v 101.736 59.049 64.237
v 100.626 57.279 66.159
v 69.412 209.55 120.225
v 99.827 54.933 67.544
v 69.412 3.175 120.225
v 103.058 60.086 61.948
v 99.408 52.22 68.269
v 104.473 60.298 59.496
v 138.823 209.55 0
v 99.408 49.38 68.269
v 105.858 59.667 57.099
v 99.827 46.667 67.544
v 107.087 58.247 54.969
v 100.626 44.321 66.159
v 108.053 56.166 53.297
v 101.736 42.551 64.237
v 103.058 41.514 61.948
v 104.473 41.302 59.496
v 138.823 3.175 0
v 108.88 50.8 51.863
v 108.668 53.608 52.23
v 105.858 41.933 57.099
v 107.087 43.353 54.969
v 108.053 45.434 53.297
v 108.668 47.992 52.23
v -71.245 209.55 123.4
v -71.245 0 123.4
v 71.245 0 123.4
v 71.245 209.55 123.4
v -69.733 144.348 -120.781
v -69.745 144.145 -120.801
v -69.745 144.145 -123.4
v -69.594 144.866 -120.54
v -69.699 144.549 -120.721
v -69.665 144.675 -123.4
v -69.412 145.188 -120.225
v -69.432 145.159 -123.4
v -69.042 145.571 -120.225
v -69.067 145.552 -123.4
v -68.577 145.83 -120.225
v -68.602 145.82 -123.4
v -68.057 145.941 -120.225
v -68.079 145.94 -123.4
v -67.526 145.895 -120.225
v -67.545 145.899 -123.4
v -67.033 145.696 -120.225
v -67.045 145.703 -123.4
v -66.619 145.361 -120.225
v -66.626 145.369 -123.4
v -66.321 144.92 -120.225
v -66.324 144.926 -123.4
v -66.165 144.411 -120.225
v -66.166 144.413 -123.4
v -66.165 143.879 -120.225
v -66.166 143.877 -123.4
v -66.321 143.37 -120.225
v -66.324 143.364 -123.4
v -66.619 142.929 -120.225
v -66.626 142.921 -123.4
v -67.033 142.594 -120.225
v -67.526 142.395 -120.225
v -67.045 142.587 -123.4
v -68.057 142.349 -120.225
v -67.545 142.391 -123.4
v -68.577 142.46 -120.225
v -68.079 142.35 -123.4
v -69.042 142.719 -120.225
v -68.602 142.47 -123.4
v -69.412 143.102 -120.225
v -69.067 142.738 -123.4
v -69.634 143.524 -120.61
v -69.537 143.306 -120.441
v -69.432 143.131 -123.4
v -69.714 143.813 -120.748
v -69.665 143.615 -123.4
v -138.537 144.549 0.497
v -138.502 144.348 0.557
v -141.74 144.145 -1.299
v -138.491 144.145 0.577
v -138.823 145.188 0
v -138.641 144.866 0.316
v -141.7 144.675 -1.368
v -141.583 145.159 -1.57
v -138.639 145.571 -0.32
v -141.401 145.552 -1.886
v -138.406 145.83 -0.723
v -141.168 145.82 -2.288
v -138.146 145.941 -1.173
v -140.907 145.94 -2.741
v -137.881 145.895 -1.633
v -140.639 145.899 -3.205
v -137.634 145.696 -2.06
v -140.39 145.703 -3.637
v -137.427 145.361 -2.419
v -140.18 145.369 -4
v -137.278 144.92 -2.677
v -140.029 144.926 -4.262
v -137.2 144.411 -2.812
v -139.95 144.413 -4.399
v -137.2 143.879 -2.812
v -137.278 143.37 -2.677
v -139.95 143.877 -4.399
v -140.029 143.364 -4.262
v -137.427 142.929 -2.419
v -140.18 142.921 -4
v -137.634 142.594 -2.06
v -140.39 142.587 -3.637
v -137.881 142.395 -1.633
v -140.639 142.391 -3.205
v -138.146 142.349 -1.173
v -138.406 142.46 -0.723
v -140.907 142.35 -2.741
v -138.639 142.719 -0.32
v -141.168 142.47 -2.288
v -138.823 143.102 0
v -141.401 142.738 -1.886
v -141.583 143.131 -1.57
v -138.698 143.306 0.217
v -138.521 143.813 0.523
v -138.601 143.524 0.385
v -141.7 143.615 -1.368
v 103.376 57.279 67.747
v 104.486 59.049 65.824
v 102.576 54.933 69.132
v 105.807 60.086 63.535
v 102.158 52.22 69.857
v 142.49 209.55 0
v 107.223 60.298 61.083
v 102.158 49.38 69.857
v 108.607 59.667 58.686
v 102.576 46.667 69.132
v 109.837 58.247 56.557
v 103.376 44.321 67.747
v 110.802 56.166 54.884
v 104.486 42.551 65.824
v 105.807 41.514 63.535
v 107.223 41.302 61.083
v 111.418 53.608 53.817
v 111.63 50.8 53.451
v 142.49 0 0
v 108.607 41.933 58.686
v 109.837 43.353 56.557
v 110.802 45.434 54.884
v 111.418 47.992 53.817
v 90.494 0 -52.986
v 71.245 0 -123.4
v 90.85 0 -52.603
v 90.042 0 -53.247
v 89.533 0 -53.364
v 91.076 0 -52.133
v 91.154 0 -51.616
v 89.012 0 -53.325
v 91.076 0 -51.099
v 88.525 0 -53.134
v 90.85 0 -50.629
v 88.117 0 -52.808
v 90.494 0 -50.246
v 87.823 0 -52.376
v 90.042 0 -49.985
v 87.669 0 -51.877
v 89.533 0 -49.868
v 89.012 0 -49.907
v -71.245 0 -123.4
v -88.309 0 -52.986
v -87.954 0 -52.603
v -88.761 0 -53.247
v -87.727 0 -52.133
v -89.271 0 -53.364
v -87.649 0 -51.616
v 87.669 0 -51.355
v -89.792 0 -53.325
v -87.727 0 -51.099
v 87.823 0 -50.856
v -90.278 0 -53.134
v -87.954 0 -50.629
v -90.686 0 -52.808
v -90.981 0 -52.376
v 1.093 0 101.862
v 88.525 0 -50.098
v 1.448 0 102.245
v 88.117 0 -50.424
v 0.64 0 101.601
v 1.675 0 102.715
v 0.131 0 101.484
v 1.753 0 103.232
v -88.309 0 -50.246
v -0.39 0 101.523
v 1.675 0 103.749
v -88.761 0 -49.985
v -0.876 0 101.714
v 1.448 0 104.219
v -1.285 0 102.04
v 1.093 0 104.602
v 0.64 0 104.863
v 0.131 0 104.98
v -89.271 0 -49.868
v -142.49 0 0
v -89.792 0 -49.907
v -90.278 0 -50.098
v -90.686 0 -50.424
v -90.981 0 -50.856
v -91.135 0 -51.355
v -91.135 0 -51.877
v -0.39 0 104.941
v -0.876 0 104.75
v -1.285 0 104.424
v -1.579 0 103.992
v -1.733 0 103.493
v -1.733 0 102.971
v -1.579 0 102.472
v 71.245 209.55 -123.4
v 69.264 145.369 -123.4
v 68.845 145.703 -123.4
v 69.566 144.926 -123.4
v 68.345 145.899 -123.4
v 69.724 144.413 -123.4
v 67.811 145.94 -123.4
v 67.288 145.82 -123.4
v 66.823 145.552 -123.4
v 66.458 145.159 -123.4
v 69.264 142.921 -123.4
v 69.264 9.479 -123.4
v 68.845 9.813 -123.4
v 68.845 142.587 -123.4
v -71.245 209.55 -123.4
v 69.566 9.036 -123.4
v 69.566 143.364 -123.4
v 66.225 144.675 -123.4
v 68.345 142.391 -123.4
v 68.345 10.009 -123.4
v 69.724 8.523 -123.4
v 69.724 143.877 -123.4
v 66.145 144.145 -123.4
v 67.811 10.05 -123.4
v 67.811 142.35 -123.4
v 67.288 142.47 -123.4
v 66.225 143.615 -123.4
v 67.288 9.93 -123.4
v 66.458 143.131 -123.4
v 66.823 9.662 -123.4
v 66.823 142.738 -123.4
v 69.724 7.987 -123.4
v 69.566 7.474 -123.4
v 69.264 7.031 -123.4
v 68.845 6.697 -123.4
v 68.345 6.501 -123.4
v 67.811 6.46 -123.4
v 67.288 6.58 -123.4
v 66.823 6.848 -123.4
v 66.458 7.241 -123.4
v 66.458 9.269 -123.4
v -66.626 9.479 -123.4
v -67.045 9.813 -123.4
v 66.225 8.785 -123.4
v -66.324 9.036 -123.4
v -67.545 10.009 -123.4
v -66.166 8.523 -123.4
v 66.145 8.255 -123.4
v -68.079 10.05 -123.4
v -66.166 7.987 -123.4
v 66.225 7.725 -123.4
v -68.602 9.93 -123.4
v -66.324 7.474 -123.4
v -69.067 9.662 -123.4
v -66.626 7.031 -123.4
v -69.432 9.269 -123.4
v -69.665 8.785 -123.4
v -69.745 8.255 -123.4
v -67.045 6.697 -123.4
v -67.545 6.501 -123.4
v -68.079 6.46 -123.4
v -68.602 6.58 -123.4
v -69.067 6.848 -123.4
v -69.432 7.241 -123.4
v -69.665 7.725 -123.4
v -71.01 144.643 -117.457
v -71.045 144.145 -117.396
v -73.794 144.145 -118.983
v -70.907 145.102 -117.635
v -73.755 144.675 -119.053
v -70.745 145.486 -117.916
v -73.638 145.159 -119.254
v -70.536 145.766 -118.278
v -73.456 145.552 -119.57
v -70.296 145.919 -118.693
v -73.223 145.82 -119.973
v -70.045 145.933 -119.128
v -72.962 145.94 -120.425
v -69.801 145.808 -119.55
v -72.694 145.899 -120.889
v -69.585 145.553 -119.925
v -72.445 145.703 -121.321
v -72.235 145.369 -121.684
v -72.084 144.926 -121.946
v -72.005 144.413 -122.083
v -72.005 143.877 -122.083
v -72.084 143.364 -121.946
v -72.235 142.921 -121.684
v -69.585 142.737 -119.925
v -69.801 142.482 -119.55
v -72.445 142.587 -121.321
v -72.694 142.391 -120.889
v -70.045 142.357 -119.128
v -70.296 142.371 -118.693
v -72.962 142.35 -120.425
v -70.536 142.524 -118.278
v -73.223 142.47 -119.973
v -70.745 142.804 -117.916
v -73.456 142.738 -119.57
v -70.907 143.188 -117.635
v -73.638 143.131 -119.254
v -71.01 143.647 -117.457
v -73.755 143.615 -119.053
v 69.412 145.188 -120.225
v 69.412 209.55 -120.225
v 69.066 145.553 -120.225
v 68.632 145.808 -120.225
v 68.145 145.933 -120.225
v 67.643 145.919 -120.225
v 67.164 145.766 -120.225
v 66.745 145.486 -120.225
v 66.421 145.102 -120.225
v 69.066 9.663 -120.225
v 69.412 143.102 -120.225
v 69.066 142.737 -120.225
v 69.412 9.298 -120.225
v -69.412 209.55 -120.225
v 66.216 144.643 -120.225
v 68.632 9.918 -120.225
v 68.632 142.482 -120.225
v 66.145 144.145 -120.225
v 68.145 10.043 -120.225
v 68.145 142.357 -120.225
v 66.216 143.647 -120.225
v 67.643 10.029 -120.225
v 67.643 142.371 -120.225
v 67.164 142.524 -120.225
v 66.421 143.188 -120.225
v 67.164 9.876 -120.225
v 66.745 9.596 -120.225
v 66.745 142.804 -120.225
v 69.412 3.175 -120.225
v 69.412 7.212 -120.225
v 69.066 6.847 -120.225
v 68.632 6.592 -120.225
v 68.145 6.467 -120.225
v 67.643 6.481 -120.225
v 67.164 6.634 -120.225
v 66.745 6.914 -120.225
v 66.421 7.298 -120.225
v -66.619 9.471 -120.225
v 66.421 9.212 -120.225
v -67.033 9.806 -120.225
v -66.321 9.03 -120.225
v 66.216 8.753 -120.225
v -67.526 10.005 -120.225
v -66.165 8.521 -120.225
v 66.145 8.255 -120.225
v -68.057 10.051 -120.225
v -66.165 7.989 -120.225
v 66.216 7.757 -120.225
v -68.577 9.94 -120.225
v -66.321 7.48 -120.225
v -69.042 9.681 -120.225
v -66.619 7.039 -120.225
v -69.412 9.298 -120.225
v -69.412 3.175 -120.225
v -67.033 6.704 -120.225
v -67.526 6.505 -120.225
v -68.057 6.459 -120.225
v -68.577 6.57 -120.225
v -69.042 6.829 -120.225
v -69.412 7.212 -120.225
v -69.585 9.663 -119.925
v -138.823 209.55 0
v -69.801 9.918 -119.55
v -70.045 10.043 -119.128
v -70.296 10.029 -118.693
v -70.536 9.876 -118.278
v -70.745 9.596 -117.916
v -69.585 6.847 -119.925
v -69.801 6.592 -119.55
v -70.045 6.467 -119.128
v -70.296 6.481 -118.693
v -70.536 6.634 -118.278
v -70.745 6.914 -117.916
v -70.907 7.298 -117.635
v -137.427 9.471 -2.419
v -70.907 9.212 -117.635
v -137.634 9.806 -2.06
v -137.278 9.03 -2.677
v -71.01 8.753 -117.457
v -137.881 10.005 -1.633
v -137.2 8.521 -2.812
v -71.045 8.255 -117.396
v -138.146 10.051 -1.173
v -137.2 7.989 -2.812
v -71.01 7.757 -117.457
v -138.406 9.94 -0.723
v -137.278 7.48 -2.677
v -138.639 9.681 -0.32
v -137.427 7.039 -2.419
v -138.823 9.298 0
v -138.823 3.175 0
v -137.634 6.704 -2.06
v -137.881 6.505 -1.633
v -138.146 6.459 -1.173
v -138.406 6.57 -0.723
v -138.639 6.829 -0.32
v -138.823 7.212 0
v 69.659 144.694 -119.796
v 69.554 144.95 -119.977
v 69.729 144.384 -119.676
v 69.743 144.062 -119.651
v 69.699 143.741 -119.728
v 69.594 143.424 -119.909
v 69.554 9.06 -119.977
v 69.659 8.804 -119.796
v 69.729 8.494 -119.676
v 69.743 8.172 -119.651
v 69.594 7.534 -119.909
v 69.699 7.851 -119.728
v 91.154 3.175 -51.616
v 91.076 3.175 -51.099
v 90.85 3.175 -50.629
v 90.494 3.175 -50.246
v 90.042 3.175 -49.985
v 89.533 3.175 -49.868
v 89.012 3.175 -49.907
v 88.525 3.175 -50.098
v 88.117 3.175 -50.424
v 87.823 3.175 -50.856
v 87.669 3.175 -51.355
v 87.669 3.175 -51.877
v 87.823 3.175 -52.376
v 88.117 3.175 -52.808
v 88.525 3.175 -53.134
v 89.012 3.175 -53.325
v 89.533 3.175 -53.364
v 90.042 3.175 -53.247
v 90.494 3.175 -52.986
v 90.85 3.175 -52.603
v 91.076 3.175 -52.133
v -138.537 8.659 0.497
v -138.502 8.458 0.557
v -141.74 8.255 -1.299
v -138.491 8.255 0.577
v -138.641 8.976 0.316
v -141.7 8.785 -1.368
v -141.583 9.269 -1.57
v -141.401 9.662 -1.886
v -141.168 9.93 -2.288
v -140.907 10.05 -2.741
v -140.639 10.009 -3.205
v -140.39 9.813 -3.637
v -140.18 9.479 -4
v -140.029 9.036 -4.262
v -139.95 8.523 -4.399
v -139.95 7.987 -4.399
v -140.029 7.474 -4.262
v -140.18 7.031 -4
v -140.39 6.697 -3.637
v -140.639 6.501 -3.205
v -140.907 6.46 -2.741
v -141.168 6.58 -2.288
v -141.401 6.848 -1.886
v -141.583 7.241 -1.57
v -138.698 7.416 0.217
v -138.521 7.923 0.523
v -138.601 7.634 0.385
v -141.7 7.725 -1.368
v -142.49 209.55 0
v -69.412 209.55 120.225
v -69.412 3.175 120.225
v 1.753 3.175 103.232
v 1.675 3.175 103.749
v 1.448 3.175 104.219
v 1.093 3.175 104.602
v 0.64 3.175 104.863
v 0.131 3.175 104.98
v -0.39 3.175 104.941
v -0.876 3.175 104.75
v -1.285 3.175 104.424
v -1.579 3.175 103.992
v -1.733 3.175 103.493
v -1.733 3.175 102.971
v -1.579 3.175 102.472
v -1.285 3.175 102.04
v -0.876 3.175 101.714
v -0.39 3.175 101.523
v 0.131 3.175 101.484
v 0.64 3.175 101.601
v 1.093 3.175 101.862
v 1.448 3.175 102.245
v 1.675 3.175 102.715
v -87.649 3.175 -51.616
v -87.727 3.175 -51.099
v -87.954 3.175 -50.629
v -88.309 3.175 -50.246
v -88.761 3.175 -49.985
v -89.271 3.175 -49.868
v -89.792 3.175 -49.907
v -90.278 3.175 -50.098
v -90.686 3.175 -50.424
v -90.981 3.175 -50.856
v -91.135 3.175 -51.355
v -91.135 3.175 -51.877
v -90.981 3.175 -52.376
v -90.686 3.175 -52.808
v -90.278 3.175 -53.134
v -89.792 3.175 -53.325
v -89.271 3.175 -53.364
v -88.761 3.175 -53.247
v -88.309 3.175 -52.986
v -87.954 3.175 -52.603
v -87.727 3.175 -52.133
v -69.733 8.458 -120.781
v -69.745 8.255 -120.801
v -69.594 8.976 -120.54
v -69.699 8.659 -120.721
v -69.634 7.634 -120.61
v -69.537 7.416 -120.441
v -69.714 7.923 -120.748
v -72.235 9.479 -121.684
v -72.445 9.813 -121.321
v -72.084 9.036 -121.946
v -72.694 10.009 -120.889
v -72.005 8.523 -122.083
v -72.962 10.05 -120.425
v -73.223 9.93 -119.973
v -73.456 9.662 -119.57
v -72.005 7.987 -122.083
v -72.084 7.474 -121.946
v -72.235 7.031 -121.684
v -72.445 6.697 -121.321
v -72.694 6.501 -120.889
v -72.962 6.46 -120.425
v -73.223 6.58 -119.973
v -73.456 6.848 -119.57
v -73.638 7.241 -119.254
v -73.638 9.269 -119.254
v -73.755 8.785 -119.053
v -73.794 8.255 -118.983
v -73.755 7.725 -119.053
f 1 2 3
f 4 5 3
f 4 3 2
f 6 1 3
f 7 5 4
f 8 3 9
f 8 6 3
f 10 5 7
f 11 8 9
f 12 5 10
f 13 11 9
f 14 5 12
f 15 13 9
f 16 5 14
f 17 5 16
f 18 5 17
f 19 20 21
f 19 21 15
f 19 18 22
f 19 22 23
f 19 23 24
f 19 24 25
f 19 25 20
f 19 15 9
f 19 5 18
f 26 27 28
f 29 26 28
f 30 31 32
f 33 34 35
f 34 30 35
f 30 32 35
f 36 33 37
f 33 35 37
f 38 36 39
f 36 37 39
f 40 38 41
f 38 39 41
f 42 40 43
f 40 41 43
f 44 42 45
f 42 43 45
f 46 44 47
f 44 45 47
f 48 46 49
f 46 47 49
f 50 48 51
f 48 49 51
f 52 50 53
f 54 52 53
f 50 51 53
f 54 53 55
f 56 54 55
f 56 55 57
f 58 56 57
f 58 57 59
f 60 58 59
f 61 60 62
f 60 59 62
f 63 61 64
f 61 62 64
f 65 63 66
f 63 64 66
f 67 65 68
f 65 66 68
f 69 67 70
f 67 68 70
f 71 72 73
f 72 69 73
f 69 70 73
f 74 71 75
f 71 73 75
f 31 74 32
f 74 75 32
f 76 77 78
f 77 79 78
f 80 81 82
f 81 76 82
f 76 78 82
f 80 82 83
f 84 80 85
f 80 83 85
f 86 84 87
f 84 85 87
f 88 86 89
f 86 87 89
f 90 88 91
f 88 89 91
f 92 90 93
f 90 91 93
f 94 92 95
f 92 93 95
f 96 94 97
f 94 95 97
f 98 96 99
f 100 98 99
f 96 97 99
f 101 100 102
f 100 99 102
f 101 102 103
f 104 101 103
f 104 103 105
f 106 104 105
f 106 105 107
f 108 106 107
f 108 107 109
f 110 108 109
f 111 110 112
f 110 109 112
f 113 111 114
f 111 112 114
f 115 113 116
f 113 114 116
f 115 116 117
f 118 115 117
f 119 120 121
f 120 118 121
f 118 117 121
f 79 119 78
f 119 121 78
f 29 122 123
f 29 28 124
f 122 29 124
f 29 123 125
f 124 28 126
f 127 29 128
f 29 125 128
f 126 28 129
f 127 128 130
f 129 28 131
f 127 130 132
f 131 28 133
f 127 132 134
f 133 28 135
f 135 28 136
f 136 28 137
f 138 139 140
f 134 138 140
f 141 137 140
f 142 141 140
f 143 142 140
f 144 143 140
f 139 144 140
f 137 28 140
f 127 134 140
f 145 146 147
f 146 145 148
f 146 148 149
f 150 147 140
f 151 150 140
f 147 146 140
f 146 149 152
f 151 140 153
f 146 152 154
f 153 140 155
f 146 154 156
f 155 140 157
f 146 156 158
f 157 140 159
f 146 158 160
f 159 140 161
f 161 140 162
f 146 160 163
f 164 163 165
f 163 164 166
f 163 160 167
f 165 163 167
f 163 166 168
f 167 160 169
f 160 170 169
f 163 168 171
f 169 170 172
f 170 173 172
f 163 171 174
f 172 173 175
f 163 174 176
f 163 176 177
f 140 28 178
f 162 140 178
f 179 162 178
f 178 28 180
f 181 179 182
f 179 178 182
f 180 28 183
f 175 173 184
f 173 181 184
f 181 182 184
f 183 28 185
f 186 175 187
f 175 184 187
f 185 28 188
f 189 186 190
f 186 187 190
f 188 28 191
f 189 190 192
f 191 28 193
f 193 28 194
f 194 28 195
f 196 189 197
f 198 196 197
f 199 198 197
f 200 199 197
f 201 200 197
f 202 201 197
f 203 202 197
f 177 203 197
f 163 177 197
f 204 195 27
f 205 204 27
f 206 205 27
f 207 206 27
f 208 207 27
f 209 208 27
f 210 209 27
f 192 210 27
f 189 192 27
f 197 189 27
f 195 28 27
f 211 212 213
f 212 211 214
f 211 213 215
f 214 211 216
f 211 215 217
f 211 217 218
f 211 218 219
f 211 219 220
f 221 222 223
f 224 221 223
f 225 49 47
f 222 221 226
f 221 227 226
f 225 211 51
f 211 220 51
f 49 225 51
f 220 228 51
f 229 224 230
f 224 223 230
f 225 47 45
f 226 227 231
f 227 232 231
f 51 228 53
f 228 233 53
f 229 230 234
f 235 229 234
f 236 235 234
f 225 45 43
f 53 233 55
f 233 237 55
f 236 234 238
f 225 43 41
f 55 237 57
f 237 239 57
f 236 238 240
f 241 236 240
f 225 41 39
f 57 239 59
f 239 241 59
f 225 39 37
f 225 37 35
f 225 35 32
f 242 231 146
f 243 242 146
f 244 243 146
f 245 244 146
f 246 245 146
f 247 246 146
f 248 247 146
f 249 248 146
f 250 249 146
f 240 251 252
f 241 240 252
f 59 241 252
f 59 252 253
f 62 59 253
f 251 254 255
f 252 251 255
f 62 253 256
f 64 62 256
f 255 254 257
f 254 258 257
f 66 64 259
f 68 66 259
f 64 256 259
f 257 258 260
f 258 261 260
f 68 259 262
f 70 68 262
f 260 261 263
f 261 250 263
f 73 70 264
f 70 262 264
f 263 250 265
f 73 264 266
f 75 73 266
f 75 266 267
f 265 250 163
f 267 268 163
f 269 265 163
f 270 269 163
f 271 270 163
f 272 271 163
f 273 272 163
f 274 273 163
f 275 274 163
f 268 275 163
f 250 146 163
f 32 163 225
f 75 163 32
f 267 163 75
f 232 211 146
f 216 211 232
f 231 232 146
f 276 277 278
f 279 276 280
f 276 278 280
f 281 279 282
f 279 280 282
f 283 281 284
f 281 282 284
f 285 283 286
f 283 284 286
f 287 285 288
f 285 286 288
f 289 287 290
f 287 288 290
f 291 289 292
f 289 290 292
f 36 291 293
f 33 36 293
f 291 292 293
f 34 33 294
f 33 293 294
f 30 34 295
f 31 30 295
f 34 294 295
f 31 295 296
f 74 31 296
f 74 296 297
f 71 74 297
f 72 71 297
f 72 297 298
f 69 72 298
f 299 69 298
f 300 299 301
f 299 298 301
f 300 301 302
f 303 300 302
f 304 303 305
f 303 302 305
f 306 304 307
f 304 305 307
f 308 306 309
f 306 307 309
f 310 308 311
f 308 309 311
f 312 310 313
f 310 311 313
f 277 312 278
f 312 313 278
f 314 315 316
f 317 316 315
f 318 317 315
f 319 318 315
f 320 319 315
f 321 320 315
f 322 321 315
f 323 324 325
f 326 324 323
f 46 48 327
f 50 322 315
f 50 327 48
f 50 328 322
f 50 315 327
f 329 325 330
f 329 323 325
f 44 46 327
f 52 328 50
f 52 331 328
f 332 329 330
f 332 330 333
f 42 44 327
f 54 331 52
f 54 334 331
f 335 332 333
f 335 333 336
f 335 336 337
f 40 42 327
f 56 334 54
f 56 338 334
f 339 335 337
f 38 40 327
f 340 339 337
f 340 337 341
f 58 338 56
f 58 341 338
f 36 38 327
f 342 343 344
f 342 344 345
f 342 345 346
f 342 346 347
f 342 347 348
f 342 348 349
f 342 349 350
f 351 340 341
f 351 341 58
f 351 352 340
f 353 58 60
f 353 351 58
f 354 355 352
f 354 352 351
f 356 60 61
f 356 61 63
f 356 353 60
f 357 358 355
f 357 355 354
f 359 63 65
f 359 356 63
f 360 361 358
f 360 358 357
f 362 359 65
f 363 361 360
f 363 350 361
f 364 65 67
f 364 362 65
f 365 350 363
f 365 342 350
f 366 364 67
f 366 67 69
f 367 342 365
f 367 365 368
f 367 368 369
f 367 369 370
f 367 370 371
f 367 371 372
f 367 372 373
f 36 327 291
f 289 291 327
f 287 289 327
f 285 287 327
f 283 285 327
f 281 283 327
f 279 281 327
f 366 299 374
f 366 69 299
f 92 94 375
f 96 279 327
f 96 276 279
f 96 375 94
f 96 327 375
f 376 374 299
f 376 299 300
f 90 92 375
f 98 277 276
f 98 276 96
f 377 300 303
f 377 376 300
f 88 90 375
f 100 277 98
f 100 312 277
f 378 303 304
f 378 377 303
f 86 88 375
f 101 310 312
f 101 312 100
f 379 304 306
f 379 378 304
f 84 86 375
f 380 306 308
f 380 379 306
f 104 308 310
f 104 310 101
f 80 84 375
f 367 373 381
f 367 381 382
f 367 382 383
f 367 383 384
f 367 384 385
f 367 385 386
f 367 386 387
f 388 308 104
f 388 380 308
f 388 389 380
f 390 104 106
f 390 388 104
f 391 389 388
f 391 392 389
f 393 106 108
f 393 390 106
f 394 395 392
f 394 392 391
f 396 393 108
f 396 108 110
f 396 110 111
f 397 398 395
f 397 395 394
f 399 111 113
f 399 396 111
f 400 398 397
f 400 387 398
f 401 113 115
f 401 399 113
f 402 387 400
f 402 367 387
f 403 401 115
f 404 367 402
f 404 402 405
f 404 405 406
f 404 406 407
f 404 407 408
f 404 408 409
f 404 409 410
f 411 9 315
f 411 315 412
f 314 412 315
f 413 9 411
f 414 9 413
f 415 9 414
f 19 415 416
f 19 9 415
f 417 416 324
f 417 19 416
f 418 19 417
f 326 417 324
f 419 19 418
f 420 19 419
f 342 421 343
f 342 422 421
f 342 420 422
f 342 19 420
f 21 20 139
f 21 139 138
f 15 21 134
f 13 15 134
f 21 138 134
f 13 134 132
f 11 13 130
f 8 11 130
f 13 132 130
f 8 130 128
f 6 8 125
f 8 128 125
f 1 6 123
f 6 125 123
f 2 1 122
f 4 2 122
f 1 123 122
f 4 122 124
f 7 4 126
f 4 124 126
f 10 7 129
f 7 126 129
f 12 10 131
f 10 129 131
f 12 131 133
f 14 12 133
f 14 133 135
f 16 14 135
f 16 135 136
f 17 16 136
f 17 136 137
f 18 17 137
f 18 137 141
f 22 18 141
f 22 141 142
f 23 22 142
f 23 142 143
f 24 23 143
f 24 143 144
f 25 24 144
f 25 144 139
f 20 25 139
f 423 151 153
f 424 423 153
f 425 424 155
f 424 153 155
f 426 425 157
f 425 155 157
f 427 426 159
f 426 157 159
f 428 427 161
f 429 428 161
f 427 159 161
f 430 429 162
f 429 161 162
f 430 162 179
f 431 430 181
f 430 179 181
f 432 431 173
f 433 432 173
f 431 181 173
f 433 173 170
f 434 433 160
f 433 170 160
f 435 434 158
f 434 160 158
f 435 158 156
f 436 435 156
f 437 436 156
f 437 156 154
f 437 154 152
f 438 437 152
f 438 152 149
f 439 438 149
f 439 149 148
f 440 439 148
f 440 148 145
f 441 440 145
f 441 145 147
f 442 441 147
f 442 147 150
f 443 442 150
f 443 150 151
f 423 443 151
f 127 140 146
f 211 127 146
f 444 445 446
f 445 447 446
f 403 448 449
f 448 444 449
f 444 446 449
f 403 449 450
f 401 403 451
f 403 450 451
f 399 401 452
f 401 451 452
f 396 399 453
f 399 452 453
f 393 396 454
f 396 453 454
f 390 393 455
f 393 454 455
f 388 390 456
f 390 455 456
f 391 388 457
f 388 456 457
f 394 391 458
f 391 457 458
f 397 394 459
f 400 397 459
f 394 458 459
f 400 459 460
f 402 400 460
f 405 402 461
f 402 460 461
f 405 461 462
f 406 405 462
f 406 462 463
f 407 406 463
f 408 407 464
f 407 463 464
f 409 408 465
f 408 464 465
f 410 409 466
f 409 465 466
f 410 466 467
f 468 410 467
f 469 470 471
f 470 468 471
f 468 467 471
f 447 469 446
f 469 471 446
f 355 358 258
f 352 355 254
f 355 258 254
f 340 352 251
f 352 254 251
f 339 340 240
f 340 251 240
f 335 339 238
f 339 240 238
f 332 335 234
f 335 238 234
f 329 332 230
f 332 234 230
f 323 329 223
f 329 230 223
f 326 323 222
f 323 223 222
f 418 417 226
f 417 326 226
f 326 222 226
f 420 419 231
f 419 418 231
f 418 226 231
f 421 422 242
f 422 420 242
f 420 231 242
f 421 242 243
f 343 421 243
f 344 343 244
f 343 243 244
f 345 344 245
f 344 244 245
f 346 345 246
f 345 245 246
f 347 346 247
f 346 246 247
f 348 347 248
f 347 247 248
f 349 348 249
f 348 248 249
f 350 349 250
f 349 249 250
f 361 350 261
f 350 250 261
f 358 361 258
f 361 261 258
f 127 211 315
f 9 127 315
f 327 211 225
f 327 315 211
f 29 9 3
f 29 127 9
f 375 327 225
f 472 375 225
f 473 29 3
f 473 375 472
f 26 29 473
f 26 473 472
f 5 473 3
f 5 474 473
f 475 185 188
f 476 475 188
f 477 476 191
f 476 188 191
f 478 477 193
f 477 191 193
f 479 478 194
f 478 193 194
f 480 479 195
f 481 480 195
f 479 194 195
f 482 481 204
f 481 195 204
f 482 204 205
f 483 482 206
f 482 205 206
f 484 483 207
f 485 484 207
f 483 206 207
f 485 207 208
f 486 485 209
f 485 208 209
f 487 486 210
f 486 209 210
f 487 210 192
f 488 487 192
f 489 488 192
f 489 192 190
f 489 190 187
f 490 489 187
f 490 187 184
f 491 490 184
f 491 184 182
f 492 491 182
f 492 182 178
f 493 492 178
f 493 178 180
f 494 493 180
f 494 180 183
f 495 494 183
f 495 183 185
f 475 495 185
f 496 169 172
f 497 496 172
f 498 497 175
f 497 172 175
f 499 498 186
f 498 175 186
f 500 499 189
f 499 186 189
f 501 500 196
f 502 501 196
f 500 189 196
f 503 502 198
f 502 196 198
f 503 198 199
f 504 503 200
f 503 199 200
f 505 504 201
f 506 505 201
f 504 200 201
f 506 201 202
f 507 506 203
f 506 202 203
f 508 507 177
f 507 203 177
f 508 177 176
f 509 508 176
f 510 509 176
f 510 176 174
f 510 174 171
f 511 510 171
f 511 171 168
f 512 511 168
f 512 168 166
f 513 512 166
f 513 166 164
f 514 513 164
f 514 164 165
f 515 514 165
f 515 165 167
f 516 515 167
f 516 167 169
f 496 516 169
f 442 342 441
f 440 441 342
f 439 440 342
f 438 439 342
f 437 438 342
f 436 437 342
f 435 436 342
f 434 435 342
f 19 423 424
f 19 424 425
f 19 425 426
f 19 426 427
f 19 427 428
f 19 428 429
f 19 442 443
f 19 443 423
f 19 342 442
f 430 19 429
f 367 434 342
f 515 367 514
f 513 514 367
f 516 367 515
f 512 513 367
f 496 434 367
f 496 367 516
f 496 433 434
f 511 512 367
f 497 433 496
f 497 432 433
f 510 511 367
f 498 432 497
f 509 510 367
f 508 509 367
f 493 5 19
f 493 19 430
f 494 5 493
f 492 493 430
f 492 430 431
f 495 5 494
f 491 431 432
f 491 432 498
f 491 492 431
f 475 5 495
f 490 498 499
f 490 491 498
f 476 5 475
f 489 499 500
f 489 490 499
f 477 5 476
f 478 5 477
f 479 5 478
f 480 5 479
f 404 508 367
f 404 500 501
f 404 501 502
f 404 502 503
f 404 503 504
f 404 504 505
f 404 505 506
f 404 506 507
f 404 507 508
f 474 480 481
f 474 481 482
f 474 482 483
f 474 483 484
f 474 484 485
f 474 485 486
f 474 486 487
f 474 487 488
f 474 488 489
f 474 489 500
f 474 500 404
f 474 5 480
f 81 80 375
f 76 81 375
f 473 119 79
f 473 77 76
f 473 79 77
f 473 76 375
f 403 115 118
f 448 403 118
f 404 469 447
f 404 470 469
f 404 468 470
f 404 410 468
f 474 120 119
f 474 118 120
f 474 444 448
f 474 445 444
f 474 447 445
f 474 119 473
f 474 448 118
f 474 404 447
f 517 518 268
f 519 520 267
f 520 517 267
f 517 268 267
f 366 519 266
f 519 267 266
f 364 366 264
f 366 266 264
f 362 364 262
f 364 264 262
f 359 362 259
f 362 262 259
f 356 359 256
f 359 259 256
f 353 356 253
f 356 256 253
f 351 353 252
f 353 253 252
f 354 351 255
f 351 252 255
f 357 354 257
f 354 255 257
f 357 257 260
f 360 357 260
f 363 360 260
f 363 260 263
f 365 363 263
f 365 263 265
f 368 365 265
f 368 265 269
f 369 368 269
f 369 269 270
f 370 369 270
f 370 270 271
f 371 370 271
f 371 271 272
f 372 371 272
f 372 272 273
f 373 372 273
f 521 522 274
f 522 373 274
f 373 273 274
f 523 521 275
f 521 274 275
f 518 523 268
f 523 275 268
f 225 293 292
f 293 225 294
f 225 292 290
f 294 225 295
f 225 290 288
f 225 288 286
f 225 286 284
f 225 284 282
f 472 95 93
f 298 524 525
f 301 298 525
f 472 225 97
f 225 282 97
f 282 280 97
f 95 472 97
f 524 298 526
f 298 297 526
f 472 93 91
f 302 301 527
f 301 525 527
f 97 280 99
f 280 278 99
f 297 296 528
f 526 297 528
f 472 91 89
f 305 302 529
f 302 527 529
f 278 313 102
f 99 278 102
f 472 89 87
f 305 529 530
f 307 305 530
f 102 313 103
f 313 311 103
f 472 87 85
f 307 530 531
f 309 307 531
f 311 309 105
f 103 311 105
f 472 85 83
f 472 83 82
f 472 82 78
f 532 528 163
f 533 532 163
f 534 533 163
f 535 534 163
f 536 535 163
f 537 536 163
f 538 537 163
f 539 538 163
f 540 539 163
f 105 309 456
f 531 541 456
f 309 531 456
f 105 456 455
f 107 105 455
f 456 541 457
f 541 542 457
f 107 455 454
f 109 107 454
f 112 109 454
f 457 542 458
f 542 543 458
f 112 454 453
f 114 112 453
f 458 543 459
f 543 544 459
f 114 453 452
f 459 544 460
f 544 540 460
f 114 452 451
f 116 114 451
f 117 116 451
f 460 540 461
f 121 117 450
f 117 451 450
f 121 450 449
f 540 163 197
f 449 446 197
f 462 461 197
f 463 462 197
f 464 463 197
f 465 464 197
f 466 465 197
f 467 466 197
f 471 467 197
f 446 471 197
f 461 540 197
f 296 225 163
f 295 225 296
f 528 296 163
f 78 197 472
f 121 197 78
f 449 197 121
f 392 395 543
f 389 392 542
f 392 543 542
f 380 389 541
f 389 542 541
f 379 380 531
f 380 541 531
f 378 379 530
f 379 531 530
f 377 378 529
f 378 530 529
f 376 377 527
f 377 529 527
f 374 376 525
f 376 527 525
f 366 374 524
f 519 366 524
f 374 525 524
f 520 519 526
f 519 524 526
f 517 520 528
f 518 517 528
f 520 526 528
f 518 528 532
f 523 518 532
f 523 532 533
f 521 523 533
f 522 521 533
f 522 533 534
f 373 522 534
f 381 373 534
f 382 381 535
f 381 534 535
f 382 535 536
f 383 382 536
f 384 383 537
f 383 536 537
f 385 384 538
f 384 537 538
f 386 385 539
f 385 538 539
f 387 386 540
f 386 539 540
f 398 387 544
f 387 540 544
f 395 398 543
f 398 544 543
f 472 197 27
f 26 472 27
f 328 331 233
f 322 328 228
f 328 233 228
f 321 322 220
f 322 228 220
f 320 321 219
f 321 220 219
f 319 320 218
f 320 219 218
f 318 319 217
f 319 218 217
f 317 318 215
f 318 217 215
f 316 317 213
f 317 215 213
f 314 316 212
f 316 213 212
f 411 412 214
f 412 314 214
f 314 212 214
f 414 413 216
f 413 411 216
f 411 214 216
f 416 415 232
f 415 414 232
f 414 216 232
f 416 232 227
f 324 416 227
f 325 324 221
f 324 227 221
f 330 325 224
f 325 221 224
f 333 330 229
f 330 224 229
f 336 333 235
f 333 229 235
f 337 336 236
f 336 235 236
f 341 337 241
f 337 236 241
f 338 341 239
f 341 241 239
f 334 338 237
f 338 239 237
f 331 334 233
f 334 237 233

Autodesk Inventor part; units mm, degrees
ref_plane "YZ Plane" through (0, 0, 0) normal (1, 0, 0) x (0, 1, 0)
ref_plane "XZ Plane" through (0, 0, 0) normal (0, 1, 0) x (-1, 0, 0)
ref_plane "XY Plane" through (0, 0, 0) normal (0, 0, 1) x (1, 0, 0)
sketch "Sketch1" plane through (0, 0, 0) normal (0, 1, 0) x (-1, 0, 0)
  circle A0 centre (0, 0) radius 95.25 construction
  circle A1 centre (0, 0) radius 120.65 construction
  line L0 (-69.6573, -120.65) -> (-139.3146, 0)
  line L1 (-139.3146, 0) -> (-69.6573, 120.65)
  line L2 (-69.6573, 120.65) -> (69.6573, 120.65)
  line L3 (69.6573, 120.65) -> (139.3146, 0)
  line L4 (139.3146, 0) -> (69.6573, -120.65)
  line L5 (69.6573, -120.65) -> (-69.6573, -120.65)
  line L6 (142.4896, 0) -> (71.2448, 123.3996)
  line L7 (71.2448, 123.3996) -> (-71.2448, 123.3996)
  line L8 (-71.2448, 123.3996) -> (-142.4896, 0)
  line L9 (-142.4896, 0) -> (-71.2448, -123.3996)
  line L10 (-71.2448, -123.3996) -> (71.2448, -123.3996)
  line L11 (71.2448, -123.3996) -> (142.4896, 0)
  dimension "d0" = 190.5
  dimension "d1" = 25.4
  dimension "d2" = 3.175
extrude "Extrusion1" add sketch "Sketch1" along normal blind 209.55 contours L0 L1 L2 L3 L4 L5 | L11 L10 L9 L8 L7 L6
shell "Shell1" thickness 3.175 removed faces 1 at (47.4965, 209.55, 0)
sketch "Sketch2" plane through (142.4896, 0, 0) normal (0.866, 0, 0.5) x (0.5, 0, -0.866)
  circle A0 centre (-71.2448, 50.8) radius 9.525
  line L0 (-142.4896, 0) -> (0, 0) projected
  point P0 (-71.2448, 0)
  point P1 (-71.2448, 0)
  dimension "d15" = 19.05
  dimension "d16" = 50.8
extrude "Extrusion2" cut sketch "Sketch2" against normal up to next
sketch "Sketch3" plane through (0, 0, 0) normal (0, -1, 0) x (1, 0, 0)
  line L0 (-71.2448, 123.3996) -> (71.2448, 123.3996) projected
  circle A0 centre (0, 103.232) radius 1.7526
  line L1 (142.4896, 0) -> (71.2448, -123.3996) projected
  line L2 (106.8672, -61.6998) -> (130.6924, -61.6998) construction
  line L3 (-71.2448, -123.3996) -> (-142.4896, 0) projected
  line L4 (-106.8672, -61.6998) -> (-83.042, -61.6998) construction
  circle A1 centre (-89.4016, -51.616) radius 1.7526
  circle A2 centre (89.4016, -51.616) radius 1.7526
  point P0 (0, 0)
  dimension "d20" = 3.5052
  dimension "d21" = 20.1676
  dimension "d26" = 3.5052
  dimension "d27" = 3.5052
  dimension "d28" = 20.1676
  dimension "d29" = 20.1676
extrude "Extrusion3" cut sketch "Sketch3" against normal blind 12.7
thread "Thread1" size "6-32 UNC" class "2B" standard "ANSI Unified Screw Threads" full length
thread "Thread2" size "6-32 UNC" class "2B" standard "ANSI Unified Screw Threads" full length
thread "Thread3" size "6-32 UNC" class "2B" standard "ANSI Unified Screw Threads" full length
sketch "Sketch4" plane through (71.2448, 0, -123.3996) normal (0, 0, -1) x (-1, 0, 0)
  line L0 (3.2998, 144.145) -> (139.1898, 144.145) construction
  line L1 (139.1898, 144.145) -> (139.1898, 8.255) construction
  line L2 (139.1898, 8.255) -> (3.2998, 8.255) construction
  line L3 (3.2998, 8.255) -> (3.2998, 144.145) construction
  line L4 (3.2998, 144.145) -> (139.1898, 8.255) construction
  line L5 (139.1898, 144.145) -> (3.2998, 8.255) construction
  line L6 (0, 0) -> (142.4896, 0) projected
  circle A0 centre (139.1898, 144.145) radius 1.7996
  circle A1 centre (3.2998, 144.145) radius 1.7996
  circle A2 centre (3.2998, 8.255) radius 1.7996
  circle A3 centre (139.1898, 8.255) radius 1.7996
  point P0 (71.2448, 0)
  point P1 (71.2448, 76.2)
  point P2 (71.2448, 76.2)
  point P3 (71.2448, 0)
  dimension "d38" = 135.89
  dimension "d39" = 76.2
  dimension "d40" = 3.5992
sketch "Sketch5" plane through (-142.4896, 0, 0) normal (-0.866, 0, -0.5) x (-0.5, 0, 0.866)
  line L0 (-139.1898, 144.145) -> (-3.2998, 144.145) construction
  line L1 (-3.2998, 144.145) -> (-3.2998, 8.255) construction
  line L2 (-3.2998, 8.255) -> (-139.1898, 8.255) construction
  line L3 (-139.1898, 8.255) -> (-139.1898, 144.145) construction
  line L4 (-139.1898, 144.145) -> (-3.2998, 8.255) construction
  line L5 (-3.2998, 144.145) -> (-139.1898, 8.255) construction
  line L6 (0, 0) -> (-142.4896, 0)
  circle A0 centre (-3.2998, 144.145) radius 1.7996
  circle A1 centre (-139.1898, 144.145) radius 1.7996
  circle A2 centre (-139.1898, 8.255) radius 1.7996
  circle A3 centre (-3.2998, 8.255) radius 1.7996
  line L7 (-142.4896, 0) -> (0, 0) projected
  point P0 (-71.2448, 0)
  point P1 (-71.2448, 0)
  point P2 (-71.2448, 76.2)
  point P3 (-71.2448, 76.2)
  point P4 (-71.2448, 0)
  point P5 (-71.2448, 0)
  point P6 (-71.2448, 76.2)
  point P7 (-71.2448, 0)
  dimension "d41" = 135.89
  dimension "d42" = 76.2
  dimension "d43" = 3.5992
extrude "Extrusion4" cut sketch "Sketch4" against normal up to next
extrude "Extrusion5" cut sketch "Sketch5" against normal up to next
equation "\"d5\" = d2"
properties part number "HS-01" material "Aluminum 6061 Painted"
